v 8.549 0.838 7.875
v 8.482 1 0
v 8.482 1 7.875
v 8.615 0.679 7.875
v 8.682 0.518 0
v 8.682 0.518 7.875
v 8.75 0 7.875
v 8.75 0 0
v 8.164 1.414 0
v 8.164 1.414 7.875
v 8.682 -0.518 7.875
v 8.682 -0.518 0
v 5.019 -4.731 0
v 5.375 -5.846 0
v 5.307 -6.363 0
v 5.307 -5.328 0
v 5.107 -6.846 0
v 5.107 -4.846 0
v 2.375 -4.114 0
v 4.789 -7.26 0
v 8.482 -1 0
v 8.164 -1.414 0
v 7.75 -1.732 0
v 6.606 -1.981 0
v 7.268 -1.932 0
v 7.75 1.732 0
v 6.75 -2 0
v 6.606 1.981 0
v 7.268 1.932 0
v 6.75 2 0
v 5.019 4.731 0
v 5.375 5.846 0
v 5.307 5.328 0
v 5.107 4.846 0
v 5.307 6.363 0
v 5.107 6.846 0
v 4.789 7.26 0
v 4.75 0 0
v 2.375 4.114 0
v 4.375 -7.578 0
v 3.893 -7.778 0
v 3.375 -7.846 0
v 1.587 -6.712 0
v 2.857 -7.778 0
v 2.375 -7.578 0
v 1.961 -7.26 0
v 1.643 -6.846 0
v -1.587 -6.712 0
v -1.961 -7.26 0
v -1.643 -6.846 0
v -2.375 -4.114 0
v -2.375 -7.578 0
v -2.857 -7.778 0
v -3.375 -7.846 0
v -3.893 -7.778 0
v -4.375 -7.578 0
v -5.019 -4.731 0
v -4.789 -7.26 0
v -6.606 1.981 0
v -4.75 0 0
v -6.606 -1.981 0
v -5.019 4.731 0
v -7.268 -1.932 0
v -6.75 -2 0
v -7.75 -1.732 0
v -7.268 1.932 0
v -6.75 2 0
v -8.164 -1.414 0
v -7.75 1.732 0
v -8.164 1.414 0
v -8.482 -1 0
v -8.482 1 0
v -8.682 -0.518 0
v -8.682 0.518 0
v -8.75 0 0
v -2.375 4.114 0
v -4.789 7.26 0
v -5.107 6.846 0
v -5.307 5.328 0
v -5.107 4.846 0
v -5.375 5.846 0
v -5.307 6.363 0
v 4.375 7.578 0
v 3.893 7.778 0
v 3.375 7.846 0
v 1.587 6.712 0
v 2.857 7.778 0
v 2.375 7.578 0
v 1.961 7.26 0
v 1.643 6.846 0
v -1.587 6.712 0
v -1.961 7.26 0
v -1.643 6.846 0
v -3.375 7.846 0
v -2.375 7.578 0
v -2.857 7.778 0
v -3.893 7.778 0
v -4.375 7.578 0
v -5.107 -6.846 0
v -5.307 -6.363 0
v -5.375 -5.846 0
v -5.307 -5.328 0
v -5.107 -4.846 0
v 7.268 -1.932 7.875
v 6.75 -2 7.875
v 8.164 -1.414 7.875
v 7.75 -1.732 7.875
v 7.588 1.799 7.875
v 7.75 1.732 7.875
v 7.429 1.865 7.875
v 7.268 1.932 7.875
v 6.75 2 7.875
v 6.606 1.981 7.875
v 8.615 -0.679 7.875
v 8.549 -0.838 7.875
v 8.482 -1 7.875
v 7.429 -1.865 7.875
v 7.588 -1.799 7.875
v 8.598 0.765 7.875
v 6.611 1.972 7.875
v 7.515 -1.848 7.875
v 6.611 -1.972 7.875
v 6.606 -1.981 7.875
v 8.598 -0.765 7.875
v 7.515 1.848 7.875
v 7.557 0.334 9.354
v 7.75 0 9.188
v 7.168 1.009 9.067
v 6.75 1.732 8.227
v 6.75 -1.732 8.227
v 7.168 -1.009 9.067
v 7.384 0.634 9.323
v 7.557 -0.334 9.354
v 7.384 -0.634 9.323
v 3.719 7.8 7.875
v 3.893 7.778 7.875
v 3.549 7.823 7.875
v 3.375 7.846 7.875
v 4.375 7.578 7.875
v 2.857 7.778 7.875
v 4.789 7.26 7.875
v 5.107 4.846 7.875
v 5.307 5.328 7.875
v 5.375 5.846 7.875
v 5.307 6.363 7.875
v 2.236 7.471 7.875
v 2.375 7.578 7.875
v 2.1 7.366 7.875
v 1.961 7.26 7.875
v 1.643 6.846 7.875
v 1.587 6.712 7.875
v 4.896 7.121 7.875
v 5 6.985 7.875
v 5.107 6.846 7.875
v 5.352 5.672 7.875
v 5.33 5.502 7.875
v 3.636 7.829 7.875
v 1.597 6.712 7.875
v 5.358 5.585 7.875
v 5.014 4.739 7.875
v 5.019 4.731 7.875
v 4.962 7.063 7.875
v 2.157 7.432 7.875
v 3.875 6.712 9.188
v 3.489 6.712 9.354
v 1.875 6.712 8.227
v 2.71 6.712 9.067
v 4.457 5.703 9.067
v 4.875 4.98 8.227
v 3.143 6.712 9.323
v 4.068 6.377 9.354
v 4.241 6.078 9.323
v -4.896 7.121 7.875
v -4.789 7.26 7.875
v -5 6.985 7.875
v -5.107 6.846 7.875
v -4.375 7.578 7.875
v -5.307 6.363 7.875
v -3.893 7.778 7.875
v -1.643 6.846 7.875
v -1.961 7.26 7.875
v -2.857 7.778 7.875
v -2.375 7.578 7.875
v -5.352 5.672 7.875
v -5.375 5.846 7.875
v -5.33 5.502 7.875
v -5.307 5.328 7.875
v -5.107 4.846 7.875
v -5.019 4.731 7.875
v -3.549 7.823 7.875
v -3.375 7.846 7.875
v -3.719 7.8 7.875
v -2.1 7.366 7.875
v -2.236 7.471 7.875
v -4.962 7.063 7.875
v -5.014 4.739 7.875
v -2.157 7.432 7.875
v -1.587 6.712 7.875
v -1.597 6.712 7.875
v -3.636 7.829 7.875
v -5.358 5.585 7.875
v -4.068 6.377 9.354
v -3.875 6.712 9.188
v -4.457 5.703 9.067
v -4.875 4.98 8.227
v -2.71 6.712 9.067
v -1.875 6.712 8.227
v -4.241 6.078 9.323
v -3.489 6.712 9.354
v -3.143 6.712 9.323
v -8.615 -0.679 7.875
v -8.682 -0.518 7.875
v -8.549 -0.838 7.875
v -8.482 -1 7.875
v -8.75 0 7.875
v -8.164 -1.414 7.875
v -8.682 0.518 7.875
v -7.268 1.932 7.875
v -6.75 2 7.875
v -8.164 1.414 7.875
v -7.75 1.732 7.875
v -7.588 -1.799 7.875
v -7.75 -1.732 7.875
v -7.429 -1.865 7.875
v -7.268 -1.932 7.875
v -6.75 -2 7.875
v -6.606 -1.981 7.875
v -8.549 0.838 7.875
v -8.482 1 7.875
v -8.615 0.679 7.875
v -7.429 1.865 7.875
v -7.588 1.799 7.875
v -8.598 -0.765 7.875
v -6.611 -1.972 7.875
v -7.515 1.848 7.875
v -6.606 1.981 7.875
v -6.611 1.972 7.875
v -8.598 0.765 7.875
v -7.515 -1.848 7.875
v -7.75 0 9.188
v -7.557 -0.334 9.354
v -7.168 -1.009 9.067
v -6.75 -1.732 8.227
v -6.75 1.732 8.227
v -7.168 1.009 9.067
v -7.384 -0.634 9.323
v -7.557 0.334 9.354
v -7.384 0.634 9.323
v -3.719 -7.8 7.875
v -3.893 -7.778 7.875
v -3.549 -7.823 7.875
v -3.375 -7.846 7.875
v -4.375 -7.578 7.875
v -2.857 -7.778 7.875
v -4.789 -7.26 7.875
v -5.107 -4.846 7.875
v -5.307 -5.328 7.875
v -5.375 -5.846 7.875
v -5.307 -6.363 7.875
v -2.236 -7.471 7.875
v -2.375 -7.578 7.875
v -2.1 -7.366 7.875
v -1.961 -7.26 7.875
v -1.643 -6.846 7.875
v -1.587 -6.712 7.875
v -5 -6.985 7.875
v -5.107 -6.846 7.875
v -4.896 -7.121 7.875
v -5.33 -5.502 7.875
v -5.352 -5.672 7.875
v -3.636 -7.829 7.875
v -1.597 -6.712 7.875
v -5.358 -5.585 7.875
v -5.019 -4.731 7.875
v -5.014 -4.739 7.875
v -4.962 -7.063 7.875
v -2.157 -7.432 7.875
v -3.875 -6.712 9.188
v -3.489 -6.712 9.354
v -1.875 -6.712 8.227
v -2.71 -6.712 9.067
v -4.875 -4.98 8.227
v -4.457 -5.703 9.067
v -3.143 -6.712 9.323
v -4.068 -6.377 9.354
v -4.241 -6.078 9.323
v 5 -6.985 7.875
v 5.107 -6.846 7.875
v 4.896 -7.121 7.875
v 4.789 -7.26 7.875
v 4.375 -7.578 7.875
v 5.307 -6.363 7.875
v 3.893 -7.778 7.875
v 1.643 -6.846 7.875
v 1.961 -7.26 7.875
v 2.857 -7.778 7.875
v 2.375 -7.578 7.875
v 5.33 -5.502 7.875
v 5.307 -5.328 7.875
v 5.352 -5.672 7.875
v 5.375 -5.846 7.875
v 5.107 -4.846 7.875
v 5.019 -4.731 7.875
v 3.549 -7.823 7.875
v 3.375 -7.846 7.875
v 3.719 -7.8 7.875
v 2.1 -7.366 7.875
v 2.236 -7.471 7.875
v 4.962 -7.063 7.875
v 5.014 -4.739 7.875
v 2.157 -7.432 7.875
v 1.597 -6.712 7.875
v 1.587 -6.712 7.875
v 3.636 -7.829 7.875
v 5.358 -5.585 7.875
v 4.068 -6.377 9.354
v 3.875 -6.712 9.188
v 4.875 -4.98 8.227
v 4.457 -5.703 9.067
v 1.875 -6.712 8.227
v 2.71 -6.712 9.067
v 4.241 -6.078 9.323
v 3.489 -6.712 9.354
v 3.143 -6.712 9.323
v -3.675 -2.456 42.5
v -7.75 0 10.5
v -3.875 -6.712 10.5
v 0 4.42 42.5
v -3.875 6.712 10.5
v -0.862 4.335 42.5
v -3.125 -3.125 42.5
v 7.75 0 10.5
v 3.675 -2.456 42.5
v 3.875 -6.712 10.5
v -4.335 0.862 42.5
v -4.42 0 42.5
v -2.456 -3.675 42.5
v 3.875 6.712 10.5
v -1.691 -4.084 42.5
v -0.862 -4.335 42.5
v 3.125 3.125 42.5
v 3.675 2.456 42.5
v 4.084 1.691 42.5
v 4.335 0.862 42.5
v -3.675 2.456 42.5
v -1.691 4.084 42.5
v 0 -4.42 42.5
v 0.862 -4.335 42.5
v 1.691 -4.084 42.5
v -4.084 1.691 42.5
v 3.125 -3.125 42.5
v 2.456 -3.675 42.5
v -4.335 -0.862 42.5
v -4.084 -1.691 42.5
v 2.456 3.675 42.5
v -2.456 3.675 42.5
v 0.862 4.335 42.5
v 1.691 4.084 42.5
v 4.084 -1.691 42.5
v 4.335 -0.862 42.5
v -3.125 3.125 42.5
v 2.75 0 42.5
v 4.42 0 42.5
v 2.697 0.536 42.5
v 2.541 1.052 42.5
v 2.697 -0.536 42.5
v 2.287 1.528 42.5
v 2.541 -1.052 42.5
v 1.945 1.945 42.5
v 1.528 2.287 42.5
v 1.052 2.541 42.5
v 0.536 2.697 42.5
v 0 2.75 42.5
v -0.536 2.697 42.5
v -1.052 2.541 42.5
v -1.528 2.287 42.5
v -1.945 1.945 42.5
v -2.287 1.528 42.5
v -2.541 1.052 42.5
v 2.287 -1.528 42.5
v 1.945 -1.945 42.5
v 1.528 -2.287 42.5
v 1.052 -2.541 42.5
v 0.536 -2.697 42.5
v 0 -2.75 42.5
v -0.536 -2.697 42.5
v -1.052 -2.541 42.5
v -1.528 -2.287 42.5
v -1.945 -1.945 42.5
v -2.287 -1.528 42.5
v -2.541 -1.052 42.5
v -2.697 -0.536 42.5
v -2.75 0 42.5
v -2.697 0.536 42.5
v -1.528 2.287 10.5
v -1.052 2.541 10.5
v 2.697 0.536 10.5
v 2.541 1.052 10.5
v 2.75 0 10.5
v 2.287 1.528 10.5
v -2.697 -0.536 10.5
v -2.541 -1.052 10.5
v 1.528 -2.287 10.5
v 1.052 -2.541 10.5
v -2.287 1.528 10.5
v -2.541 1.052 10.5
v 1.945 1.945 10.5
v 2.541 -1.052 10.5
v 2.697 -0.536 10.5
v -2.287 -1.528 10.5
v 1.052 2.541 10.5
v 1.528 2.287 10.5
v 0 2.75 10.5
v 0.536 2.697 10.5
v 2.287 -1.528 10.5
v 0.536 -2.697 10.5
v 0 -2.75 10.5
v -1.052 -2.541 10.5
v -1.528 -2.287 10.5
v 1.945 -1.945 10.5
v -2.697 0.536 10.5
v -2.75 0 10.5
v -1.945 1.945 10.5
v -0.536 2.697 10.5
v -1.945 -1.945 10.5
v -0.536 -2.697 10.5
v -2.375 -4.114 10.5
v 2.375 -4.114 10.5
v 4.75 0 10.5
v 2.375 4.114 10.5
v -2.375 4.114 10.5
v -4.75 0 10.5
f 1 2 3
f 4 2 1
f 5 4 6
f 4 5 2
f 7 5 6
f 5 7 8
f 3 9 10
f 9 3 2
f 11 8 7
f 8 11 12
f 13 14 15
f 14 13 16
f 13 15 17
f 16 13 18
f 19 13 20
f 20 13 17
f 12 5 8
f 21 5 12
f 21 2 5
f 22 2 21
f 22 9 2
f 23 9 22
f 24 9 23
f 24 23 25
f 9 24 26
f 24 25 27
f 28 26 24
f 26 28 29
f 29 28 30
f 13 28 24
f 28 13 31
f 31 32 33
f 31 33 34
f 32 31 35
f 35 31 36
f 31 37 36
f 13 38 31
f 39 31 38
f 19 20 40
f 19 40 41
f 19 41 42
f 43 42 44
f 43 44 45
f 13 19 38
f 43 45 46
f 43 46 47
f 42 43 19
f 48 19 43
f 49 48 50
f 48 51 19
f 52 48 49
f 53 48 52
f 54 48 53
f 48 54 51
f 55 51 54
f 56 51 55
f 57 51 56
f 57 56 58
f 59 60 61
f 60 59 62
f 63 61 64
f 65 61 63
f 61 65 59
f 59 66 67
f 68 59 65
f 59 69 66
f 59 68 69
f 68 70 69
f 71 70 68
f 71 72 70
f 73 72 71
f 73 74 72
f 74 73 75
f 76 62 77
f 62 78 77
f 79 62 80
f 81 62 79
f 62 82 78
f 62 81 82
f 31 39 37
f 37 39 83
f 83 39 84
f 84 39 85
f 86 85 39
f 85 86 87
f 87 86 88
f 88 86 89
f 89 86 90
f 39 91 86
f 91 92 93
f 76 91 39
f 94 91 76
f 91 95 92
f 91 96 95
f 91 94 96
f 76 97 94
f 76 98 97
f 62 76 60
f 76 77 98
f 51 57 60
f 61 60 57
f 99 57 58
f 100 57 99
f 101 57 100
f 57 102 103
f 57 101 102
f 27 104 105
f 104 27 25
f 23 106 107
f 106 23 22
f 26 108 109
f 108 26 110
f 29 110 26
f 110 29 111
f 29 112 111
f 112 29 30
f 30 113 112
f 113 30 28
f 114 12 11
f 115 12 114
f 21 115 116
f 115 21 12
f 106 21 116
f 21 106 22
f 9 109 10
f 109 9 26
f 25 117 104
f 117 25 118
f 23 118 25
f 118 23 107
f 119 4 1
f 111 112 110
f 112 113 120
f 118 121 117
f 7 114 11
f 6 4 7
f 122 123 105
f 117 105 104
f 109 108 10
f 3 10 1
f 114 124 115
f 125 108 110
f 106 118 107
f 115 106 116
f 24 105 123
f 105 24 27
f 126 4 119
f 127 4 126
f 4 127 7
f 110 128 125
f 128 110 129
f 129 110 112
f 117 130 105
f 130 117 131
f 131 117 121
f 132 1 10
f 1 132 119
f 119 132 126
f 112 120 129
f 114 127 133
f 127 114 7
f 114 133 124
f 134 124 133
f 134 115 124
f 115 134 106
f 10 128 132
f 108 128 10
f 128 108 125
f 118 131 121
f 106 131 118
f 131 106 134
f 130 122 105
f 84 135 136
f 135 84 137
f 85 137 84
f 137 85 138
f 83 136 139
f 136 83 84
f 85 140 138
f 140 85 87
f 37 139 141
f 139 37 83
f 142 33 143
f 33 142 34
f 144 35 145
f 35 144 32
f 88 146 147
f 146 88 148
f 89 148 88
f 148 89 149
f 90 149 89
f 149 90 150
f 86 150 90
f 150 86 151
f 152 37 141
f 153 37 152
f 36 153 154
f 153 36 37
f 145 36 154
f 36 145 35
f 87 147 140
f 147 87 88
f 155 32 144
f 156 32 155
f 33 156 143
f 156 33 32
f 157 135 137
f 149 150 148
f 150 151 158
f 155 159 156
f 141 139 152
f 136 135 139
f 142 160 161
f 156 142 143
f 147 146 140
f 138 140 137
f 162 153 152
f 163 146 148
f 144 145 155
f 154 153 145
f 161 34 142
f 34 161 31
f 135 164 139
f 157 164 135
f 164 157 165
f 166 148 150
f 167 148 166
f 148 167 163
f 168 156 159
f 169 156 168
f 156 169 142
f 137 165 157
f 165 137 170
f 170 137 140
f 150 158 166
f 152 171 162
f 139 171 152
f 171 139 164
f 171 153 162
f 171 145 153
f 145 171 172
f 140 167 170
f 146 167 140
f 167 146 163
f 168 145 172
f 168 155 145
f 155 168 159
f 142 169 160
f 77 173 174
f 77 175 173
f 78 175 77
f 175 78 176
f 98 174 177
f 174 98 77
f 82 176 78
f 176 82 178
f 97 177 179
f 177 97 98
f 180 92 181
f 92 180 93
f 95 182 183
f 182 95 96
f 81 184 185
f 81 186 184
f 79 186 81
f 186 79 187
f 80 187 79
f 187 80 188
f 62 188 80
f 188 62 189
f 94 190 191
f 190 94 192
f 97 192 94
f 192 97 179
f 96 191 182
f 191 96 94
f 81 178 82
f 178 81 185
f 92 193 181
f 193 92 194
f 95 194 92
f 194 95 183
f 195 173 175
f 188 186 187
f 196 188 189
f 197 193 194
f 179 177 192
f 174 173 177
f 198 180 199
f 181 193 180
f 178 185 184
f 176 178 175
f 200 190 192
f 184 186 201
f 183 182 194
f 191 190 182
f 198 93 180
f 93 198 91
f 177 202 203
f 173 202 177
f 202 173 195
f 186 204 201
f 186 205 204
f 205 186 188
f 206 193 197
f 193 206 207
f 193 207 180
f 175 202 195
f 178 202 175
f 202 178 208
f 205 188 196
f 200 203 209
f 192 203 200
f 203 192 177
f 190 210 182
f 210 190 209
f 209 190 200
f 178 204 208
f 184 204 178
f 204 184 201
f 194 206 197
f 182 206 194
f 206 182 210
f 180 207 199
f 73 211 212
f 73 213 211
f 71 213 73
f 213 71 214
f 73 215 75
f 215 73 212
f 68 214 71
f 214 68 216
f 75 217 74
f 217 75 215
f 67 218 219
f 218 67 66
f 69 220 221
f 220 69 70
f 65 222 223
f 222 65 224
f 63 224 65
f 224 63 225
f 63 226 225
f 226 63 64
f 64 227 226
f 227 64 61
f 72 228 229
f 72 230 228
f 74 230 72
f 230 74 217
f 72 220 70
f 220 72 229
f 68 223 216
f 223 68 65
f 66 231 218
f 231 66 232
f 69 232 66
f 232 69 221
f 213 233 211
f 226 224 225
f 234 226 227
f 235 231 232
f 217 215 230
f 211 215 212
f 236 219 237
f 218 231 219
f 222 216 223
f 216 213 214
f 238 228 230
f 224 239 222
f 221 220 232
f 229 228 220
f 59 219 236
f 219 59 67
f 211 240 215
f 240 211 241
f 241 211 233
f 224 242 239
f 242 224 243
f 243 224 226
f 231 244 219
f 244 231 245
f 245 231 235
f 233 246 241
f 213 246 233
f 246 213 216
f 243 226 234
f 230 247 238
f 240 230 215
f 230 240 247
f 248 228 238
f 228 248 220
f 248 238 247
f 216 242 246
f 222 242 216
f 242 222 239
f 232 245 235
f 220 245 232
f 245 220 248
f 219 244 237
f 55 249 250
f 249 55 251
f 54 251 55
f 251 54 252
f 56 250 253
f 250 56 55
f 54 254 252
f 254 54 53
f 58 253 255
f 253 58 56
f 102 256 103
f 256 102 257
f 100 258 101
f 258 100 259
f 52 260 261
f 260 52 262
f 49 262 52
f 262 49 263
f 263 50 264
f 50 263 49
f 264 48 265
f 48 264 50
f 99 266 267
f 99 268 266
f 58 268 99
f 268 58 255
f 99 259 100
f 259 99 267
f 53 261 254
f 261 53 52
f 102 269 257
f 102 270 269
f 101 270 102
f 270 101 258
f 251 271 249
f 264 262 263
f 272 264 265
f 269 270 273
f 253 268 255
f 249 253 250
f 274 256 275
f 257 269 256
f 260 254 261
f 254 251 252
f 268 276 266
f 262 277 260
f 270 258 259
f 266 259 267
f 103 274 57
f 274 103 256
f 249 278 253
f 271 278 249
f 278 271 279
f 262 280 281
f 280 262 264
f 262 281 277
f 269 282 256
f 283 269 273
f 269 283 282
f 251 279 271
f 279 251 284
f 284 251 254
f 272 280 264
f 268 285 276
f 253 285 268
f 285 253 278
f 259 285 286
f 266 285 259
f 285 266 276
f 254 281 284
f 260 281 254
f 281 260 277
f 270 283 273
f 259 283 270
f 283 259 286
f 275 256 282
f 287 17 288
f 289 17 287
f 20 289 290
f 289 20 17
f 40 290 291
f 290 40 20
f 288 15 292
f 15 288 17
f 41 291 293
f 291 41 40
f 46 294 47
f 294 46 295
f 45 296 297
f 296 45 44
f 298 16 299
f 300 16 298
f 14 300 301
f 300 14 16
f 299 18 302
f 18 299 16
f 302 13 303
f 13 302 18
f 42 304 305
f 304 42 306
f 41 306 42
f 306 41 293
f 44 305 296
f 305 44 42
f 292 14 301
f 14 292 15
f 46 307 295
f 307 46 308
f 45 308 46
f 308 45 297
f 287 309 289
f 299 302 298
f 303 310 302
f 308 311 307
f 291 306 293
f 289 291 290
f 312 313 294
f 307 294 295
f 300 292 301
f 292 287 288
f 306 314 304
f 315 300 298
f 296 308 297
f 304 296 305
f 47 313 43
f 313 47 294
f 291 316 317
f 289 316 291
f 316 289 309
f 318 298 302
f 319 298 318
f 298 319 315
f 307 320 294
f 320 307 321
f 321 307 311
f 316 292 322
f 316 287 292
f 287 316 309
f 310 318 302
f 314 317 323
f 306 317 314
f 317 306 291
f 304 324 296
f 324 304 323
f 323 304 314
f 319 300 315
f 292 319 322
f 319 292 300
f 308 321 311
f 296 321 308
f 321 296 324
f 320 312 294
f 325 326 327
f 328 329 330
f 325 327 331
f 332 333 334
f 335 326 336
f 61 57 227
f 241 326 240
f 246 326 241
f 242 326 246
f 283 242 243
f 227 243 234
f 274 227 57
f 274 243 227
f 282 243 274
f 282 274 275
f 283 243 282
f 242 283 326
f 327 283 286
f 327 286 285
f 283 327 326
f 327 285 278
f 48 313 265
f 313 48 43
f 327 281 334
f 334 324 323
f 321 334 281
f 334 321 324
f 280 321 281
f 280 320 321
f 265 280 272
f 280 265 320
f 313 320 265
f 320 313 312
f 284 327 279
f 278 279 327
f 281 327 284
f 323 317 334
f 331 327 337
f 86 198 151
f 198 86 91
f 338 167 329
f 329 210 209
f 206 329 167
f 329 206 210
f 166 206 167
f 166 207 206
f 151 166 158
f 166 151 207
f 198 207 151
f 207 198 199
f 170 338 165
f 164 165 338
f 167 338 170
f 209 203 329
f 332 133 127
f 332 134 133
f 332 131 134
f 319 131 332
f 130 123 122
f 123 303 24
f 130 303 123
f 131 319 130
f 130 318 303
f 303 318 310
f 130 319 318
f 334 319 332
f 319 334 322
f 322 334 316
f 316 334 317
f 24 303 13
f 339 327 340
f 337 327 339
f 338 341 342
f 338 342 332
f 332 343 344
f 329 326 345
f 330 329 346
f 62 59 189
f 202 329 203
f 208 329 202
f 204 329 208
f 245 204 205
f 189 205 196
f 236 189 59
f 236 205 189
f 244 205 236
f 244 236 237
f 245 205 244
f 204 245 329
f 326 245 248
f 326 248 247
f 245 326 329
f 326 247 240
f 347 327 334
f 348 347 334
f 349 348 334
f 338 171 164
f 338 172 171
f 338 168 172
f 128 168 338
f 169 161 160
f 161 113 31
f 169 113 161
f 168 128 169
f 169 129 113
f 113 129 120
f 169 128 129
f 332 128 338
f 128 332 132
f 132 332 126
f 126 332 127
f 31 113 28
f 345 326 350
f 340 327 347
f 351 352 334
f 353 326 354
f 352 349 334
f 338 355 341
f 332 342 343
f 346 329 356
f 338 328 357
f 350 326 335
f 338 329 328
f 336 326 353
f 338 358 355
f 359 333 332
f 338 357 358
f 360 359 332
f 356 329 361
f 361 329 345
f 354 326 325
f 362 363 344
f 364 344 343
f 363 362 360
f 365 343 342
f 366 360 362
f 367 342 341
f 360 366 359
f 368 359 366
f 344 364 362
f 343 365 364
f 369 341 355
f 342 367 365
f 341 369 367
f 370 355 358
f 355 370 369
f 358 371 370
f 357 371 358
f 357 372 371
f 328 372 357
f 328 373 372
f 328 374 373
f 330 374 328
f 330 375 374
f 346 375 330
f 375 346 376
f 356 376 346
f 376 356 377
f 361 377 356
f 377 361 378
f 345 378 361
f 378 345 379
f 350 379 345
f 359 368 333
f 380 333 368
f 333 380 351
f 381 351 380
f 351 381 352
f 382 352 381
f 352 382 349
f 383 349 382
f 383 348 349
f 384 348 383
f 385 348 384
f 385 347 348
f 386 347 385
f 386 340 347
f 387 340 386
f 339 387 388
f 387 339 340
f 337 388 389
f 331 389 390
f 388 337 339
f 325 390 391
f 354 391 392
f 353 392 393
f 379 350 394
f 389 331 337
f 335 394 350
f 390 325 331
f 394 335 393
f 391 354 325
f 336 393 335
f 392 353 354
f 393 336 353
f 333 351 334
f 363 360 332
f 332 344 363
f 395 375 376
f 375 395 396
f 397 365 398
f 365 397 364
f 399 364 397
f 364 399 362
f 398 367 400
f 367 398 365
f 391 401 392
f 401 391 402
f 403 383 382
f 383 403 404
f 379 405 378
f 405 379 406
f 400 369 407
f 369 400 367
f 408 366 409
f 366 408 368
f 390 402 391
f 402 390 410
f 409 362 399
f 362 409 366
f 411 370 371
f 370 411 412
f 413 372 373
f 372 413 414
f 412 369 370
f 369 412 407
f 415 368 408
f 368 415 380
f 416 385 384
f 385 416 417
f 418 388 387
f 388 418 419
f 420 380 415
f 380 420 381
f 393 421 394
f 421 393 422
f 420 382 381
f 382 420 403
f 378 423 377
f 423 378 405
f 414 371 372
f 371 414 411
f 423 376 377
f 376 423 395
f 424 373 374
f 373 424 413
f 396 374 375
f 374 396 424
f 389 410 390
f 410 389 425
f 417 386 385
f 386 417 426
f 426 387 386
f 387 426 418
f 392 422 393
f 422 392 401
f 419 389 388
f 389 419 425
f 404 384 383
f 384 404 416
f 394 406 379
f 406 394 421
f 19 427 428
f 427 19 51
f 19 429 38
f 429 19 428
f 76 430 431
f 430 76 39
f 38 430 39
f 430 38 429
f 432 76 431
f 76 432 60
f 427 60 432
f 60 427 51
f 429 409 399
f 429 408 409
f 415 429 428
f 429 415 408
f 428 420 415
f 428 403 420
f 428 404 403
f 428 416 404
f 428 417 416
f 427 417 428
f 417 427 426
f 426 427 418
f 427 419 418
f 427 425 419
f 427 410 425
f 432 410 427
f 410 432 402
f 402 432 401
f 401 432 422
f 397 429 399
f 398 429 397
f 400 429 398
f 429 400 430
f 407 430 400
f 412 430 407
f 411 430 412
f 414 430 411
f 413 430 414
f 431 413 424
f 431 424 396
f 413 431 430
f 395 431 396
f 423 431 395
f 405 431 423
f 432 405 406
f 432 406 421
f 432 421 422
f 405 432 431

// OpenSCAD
// file: ../GoPro.scad
/****************************************************************************
 * Altair's GoPro mounts library for OpenSCAD   version: 1.2.0 (2021-05-22) *
 * Copyright (c) Michal A. Valasek, 2021                                    *
 * ------------------------------------------------------------------------ *
 * www.rider.cz | www.altair.blog | github.com/ridercz/GoProScad            *
 ****************************************************************************/

// These values are fixed and defined by GoPro mount standard
__gopro_outer_diameter = 15;            // Outer diameter of the legs
__gopro_leg_width = 3;                  // Width of the legs
__gopro_slit_width = 3.5;               // Width of the slits, including tolerance
__gopro_hole_diameter = 5;              // M5
__gopro_hole_tolerance = .5;            // Print tolerance for hole
__gopro_screw_extension_length = 18;    // Length of the part of screw that sticks out
__gopro_screw_head_diameter = 9.5;      // M5
__gopro_screw_hex_head_height = 3.5;    // M5
__gopro_wall_shaft = 1.67;              // Thickness of wall in the narrow part
__gopro_wall_head = 3;                  // Thickness of wall in the wide part
__gopro_knurl_diameter = 4;             // Diameter of knurls
__gopro_knurl_offset = -1;              // Center distance offset of knurls

module gopro_mount_f(base_height = 3, base_width = 24, leg_height = 17, nut_diameter = 11.5, nut_sides = 4, nut_depth = 3, center = false, $fudge = 1) {
    // Check arguments
    assert(base_height > 0, "Parameter base_height must be greater than zero.");
    assert(base_width >= 15, "Parameter base_width must be at least 15.");
    assert(leg_height >= 15, "Parameter leg_height must be at least 15.");
    assert(nut_sides == 4 || nut_sides == 6, "Parameter nut_sides must be either 4 or 6.");

    // Computed values
    hole_offset = leg_height - __gopro_outer_diameter / 2 + base_height;
    base_depth = __gopro_slit_width * 2 + __gopro_leg_width * 3 + nut_depth;
    center_offset_y = __gopro_leg_width * 1.5 + __gopro_slit_width;

    // Model itself
    translate(center ? [0, -center_offset_y] : [0, 0]) difference() {
        // Outer shape
        hull() {
            translate([-base_width / 2, 0]) cube([base_width, base_depth, base_height]);
            translate([0, 0, hole_offset]) rotate([-90, 0, 0]) cylinder(d = __gopro_outer_diameter, h = base_depth, $fn = 64);
        }

        // Leg slits
        for(y_offset = [__gopro_leg_width, 2 * __gopro_leg_width + __gopro_slit_width]) translate([-base_width / 2 - $fudge, y_offset, base_height]) cube([base_width + 2 * $fudge, __gopro_slit_width, leg_height]);

        // Screw + nut hole
        translate([0, -$fudge, hole_offset]) rotate([-90, 0,0]) {
            cylinder(d = __gopro_hole_diameter + __gopro_hole_tolerance, h = base_depth + 2 * $fudge, $fn = 32);
            if(nut_depth > 0) translate([0, 0, base_depth + $fudge - nut_depth]) cylinder(d = nut_diameter, h = nut_depth + $fudge, $fn = nut_sides);
        }
    }
}

module gopro_mount_m(base_height = 3, base_width = 20, leg_height = 17, center = false) {
    assert(base_height > 0, "Parameter base_height must be greater than zero.");
    assert(base_width >= 15, "Parameter base_width must be at least 15.");
    assert(leg_height >= 15, "Parameter leg_height must be at least 15.");

    // Computed values
    base_depth = __gopro_leg_width * 2 + __gopro_slit_width;
    hole_offset = [base_height + leg_height - __gopro_outer_diameter / 2, base_width / 2];

    // Model itself
    translate(center ? [0, -base_depth / 2] : [0, 0]) {
        translate([-base_width / 2, 0]) cube([base_width, __gopro_leg_width * 2 + __gopro_slit_width, base_height]);
        translate([0, __gopro_leg_width + __gopro_slit_width / 2]) rotate(90) translate([base_depth / 2, -hole_offset[1]]) rotate([0, -90, 0]) for(z_offset = [0, __gopro_leg_width + __gopro_slit_width]) translate([0, 0, z_offset]) linear_extrude(__gopro_leg_width) difference() {
            hull() {
                square([base_height, base_width]);
                translate(hole_offset) circle(d = __gopro_outer_diameter, $fn = 64);
            }
            translate(hole_offset) circle(d = __gopro_hole_diameter + __gopro_hole_tolerance, $fn = 32);
        }
    }
}

module gopro_screw_handle(screw_length = 50, total_length = 0, hex_head = true, $fudge = 1) {
    assert(screw_length > __gopro_screw_extension_length + 3, "Parameter screw_length is too short.");

    // Computed values
    screw_inner_length = screw_length - __gopro_screw_extension_length;
    screw_hole_diameter = __gopro_hole_diameter + (hex_head ? __gopro_hole_tolerance : 0);
    real_total_length = total_length > 0 ? total_length : screw_inner_length + 3 * __gopro_screw_hex_head_height;
    handle_length = real_total_length - screw_inner_length;

    difference() {
        union() {
            // Base shape
            hull() {
                cylinder(d = screw_hole_diameter + 2 * __gopro_wall_shaft, h = real_total_length, $fn = 32);
                cylinder(d = __gopro_screw_head_diameter + 2 * __gopro_wall_head, h = handle_length, $fn = 6);
            }

            // Knurls
            for(a = [0 : 60 : 359]) rotate(a) translate([__gopro_screw_head_diameter / 2 + __gopro_wall_head + __gopro_knurl_offset, 0]) {
                cylinder(d = __gopro_knurl_diameter, h = handle_length * .75, $fn = 24);
                translate([0, 0, handle_length * .75]) cylinder(d1 = __gopro_knurl_diameter, d2 = 0, h = handle_length * .25, $fn = 16);
            }
        }

        // Screw hole
        translate([0, 0, -$fudge]) cylinder(d = screw_hole_diameter, h = real_total_length + 2 * $fudge, $fn = 32);
	    translate([0, 0, -$fudge]) cylinder(d = __gopro_screw_head_diameter, h = handle_length + $fudge, $fn = hex_head ? 6 : 32);
    }
}
// main file
/****************************************************************************
 * GoPro screw handle for M5x50 screws                                      *
 * Copyright (c) Michal A. Valasek, 2021                                    *
 * ------------------------------------------------------------------------ *
 * www.rider.cz | www.altair.blog | github.com/ridercz/GoProScad            *
 ****************************************************************************/

include <../GoPro.scad>;

use_hex_head = true;

gopro_screw_handle(hex_head = use_hex_head);
